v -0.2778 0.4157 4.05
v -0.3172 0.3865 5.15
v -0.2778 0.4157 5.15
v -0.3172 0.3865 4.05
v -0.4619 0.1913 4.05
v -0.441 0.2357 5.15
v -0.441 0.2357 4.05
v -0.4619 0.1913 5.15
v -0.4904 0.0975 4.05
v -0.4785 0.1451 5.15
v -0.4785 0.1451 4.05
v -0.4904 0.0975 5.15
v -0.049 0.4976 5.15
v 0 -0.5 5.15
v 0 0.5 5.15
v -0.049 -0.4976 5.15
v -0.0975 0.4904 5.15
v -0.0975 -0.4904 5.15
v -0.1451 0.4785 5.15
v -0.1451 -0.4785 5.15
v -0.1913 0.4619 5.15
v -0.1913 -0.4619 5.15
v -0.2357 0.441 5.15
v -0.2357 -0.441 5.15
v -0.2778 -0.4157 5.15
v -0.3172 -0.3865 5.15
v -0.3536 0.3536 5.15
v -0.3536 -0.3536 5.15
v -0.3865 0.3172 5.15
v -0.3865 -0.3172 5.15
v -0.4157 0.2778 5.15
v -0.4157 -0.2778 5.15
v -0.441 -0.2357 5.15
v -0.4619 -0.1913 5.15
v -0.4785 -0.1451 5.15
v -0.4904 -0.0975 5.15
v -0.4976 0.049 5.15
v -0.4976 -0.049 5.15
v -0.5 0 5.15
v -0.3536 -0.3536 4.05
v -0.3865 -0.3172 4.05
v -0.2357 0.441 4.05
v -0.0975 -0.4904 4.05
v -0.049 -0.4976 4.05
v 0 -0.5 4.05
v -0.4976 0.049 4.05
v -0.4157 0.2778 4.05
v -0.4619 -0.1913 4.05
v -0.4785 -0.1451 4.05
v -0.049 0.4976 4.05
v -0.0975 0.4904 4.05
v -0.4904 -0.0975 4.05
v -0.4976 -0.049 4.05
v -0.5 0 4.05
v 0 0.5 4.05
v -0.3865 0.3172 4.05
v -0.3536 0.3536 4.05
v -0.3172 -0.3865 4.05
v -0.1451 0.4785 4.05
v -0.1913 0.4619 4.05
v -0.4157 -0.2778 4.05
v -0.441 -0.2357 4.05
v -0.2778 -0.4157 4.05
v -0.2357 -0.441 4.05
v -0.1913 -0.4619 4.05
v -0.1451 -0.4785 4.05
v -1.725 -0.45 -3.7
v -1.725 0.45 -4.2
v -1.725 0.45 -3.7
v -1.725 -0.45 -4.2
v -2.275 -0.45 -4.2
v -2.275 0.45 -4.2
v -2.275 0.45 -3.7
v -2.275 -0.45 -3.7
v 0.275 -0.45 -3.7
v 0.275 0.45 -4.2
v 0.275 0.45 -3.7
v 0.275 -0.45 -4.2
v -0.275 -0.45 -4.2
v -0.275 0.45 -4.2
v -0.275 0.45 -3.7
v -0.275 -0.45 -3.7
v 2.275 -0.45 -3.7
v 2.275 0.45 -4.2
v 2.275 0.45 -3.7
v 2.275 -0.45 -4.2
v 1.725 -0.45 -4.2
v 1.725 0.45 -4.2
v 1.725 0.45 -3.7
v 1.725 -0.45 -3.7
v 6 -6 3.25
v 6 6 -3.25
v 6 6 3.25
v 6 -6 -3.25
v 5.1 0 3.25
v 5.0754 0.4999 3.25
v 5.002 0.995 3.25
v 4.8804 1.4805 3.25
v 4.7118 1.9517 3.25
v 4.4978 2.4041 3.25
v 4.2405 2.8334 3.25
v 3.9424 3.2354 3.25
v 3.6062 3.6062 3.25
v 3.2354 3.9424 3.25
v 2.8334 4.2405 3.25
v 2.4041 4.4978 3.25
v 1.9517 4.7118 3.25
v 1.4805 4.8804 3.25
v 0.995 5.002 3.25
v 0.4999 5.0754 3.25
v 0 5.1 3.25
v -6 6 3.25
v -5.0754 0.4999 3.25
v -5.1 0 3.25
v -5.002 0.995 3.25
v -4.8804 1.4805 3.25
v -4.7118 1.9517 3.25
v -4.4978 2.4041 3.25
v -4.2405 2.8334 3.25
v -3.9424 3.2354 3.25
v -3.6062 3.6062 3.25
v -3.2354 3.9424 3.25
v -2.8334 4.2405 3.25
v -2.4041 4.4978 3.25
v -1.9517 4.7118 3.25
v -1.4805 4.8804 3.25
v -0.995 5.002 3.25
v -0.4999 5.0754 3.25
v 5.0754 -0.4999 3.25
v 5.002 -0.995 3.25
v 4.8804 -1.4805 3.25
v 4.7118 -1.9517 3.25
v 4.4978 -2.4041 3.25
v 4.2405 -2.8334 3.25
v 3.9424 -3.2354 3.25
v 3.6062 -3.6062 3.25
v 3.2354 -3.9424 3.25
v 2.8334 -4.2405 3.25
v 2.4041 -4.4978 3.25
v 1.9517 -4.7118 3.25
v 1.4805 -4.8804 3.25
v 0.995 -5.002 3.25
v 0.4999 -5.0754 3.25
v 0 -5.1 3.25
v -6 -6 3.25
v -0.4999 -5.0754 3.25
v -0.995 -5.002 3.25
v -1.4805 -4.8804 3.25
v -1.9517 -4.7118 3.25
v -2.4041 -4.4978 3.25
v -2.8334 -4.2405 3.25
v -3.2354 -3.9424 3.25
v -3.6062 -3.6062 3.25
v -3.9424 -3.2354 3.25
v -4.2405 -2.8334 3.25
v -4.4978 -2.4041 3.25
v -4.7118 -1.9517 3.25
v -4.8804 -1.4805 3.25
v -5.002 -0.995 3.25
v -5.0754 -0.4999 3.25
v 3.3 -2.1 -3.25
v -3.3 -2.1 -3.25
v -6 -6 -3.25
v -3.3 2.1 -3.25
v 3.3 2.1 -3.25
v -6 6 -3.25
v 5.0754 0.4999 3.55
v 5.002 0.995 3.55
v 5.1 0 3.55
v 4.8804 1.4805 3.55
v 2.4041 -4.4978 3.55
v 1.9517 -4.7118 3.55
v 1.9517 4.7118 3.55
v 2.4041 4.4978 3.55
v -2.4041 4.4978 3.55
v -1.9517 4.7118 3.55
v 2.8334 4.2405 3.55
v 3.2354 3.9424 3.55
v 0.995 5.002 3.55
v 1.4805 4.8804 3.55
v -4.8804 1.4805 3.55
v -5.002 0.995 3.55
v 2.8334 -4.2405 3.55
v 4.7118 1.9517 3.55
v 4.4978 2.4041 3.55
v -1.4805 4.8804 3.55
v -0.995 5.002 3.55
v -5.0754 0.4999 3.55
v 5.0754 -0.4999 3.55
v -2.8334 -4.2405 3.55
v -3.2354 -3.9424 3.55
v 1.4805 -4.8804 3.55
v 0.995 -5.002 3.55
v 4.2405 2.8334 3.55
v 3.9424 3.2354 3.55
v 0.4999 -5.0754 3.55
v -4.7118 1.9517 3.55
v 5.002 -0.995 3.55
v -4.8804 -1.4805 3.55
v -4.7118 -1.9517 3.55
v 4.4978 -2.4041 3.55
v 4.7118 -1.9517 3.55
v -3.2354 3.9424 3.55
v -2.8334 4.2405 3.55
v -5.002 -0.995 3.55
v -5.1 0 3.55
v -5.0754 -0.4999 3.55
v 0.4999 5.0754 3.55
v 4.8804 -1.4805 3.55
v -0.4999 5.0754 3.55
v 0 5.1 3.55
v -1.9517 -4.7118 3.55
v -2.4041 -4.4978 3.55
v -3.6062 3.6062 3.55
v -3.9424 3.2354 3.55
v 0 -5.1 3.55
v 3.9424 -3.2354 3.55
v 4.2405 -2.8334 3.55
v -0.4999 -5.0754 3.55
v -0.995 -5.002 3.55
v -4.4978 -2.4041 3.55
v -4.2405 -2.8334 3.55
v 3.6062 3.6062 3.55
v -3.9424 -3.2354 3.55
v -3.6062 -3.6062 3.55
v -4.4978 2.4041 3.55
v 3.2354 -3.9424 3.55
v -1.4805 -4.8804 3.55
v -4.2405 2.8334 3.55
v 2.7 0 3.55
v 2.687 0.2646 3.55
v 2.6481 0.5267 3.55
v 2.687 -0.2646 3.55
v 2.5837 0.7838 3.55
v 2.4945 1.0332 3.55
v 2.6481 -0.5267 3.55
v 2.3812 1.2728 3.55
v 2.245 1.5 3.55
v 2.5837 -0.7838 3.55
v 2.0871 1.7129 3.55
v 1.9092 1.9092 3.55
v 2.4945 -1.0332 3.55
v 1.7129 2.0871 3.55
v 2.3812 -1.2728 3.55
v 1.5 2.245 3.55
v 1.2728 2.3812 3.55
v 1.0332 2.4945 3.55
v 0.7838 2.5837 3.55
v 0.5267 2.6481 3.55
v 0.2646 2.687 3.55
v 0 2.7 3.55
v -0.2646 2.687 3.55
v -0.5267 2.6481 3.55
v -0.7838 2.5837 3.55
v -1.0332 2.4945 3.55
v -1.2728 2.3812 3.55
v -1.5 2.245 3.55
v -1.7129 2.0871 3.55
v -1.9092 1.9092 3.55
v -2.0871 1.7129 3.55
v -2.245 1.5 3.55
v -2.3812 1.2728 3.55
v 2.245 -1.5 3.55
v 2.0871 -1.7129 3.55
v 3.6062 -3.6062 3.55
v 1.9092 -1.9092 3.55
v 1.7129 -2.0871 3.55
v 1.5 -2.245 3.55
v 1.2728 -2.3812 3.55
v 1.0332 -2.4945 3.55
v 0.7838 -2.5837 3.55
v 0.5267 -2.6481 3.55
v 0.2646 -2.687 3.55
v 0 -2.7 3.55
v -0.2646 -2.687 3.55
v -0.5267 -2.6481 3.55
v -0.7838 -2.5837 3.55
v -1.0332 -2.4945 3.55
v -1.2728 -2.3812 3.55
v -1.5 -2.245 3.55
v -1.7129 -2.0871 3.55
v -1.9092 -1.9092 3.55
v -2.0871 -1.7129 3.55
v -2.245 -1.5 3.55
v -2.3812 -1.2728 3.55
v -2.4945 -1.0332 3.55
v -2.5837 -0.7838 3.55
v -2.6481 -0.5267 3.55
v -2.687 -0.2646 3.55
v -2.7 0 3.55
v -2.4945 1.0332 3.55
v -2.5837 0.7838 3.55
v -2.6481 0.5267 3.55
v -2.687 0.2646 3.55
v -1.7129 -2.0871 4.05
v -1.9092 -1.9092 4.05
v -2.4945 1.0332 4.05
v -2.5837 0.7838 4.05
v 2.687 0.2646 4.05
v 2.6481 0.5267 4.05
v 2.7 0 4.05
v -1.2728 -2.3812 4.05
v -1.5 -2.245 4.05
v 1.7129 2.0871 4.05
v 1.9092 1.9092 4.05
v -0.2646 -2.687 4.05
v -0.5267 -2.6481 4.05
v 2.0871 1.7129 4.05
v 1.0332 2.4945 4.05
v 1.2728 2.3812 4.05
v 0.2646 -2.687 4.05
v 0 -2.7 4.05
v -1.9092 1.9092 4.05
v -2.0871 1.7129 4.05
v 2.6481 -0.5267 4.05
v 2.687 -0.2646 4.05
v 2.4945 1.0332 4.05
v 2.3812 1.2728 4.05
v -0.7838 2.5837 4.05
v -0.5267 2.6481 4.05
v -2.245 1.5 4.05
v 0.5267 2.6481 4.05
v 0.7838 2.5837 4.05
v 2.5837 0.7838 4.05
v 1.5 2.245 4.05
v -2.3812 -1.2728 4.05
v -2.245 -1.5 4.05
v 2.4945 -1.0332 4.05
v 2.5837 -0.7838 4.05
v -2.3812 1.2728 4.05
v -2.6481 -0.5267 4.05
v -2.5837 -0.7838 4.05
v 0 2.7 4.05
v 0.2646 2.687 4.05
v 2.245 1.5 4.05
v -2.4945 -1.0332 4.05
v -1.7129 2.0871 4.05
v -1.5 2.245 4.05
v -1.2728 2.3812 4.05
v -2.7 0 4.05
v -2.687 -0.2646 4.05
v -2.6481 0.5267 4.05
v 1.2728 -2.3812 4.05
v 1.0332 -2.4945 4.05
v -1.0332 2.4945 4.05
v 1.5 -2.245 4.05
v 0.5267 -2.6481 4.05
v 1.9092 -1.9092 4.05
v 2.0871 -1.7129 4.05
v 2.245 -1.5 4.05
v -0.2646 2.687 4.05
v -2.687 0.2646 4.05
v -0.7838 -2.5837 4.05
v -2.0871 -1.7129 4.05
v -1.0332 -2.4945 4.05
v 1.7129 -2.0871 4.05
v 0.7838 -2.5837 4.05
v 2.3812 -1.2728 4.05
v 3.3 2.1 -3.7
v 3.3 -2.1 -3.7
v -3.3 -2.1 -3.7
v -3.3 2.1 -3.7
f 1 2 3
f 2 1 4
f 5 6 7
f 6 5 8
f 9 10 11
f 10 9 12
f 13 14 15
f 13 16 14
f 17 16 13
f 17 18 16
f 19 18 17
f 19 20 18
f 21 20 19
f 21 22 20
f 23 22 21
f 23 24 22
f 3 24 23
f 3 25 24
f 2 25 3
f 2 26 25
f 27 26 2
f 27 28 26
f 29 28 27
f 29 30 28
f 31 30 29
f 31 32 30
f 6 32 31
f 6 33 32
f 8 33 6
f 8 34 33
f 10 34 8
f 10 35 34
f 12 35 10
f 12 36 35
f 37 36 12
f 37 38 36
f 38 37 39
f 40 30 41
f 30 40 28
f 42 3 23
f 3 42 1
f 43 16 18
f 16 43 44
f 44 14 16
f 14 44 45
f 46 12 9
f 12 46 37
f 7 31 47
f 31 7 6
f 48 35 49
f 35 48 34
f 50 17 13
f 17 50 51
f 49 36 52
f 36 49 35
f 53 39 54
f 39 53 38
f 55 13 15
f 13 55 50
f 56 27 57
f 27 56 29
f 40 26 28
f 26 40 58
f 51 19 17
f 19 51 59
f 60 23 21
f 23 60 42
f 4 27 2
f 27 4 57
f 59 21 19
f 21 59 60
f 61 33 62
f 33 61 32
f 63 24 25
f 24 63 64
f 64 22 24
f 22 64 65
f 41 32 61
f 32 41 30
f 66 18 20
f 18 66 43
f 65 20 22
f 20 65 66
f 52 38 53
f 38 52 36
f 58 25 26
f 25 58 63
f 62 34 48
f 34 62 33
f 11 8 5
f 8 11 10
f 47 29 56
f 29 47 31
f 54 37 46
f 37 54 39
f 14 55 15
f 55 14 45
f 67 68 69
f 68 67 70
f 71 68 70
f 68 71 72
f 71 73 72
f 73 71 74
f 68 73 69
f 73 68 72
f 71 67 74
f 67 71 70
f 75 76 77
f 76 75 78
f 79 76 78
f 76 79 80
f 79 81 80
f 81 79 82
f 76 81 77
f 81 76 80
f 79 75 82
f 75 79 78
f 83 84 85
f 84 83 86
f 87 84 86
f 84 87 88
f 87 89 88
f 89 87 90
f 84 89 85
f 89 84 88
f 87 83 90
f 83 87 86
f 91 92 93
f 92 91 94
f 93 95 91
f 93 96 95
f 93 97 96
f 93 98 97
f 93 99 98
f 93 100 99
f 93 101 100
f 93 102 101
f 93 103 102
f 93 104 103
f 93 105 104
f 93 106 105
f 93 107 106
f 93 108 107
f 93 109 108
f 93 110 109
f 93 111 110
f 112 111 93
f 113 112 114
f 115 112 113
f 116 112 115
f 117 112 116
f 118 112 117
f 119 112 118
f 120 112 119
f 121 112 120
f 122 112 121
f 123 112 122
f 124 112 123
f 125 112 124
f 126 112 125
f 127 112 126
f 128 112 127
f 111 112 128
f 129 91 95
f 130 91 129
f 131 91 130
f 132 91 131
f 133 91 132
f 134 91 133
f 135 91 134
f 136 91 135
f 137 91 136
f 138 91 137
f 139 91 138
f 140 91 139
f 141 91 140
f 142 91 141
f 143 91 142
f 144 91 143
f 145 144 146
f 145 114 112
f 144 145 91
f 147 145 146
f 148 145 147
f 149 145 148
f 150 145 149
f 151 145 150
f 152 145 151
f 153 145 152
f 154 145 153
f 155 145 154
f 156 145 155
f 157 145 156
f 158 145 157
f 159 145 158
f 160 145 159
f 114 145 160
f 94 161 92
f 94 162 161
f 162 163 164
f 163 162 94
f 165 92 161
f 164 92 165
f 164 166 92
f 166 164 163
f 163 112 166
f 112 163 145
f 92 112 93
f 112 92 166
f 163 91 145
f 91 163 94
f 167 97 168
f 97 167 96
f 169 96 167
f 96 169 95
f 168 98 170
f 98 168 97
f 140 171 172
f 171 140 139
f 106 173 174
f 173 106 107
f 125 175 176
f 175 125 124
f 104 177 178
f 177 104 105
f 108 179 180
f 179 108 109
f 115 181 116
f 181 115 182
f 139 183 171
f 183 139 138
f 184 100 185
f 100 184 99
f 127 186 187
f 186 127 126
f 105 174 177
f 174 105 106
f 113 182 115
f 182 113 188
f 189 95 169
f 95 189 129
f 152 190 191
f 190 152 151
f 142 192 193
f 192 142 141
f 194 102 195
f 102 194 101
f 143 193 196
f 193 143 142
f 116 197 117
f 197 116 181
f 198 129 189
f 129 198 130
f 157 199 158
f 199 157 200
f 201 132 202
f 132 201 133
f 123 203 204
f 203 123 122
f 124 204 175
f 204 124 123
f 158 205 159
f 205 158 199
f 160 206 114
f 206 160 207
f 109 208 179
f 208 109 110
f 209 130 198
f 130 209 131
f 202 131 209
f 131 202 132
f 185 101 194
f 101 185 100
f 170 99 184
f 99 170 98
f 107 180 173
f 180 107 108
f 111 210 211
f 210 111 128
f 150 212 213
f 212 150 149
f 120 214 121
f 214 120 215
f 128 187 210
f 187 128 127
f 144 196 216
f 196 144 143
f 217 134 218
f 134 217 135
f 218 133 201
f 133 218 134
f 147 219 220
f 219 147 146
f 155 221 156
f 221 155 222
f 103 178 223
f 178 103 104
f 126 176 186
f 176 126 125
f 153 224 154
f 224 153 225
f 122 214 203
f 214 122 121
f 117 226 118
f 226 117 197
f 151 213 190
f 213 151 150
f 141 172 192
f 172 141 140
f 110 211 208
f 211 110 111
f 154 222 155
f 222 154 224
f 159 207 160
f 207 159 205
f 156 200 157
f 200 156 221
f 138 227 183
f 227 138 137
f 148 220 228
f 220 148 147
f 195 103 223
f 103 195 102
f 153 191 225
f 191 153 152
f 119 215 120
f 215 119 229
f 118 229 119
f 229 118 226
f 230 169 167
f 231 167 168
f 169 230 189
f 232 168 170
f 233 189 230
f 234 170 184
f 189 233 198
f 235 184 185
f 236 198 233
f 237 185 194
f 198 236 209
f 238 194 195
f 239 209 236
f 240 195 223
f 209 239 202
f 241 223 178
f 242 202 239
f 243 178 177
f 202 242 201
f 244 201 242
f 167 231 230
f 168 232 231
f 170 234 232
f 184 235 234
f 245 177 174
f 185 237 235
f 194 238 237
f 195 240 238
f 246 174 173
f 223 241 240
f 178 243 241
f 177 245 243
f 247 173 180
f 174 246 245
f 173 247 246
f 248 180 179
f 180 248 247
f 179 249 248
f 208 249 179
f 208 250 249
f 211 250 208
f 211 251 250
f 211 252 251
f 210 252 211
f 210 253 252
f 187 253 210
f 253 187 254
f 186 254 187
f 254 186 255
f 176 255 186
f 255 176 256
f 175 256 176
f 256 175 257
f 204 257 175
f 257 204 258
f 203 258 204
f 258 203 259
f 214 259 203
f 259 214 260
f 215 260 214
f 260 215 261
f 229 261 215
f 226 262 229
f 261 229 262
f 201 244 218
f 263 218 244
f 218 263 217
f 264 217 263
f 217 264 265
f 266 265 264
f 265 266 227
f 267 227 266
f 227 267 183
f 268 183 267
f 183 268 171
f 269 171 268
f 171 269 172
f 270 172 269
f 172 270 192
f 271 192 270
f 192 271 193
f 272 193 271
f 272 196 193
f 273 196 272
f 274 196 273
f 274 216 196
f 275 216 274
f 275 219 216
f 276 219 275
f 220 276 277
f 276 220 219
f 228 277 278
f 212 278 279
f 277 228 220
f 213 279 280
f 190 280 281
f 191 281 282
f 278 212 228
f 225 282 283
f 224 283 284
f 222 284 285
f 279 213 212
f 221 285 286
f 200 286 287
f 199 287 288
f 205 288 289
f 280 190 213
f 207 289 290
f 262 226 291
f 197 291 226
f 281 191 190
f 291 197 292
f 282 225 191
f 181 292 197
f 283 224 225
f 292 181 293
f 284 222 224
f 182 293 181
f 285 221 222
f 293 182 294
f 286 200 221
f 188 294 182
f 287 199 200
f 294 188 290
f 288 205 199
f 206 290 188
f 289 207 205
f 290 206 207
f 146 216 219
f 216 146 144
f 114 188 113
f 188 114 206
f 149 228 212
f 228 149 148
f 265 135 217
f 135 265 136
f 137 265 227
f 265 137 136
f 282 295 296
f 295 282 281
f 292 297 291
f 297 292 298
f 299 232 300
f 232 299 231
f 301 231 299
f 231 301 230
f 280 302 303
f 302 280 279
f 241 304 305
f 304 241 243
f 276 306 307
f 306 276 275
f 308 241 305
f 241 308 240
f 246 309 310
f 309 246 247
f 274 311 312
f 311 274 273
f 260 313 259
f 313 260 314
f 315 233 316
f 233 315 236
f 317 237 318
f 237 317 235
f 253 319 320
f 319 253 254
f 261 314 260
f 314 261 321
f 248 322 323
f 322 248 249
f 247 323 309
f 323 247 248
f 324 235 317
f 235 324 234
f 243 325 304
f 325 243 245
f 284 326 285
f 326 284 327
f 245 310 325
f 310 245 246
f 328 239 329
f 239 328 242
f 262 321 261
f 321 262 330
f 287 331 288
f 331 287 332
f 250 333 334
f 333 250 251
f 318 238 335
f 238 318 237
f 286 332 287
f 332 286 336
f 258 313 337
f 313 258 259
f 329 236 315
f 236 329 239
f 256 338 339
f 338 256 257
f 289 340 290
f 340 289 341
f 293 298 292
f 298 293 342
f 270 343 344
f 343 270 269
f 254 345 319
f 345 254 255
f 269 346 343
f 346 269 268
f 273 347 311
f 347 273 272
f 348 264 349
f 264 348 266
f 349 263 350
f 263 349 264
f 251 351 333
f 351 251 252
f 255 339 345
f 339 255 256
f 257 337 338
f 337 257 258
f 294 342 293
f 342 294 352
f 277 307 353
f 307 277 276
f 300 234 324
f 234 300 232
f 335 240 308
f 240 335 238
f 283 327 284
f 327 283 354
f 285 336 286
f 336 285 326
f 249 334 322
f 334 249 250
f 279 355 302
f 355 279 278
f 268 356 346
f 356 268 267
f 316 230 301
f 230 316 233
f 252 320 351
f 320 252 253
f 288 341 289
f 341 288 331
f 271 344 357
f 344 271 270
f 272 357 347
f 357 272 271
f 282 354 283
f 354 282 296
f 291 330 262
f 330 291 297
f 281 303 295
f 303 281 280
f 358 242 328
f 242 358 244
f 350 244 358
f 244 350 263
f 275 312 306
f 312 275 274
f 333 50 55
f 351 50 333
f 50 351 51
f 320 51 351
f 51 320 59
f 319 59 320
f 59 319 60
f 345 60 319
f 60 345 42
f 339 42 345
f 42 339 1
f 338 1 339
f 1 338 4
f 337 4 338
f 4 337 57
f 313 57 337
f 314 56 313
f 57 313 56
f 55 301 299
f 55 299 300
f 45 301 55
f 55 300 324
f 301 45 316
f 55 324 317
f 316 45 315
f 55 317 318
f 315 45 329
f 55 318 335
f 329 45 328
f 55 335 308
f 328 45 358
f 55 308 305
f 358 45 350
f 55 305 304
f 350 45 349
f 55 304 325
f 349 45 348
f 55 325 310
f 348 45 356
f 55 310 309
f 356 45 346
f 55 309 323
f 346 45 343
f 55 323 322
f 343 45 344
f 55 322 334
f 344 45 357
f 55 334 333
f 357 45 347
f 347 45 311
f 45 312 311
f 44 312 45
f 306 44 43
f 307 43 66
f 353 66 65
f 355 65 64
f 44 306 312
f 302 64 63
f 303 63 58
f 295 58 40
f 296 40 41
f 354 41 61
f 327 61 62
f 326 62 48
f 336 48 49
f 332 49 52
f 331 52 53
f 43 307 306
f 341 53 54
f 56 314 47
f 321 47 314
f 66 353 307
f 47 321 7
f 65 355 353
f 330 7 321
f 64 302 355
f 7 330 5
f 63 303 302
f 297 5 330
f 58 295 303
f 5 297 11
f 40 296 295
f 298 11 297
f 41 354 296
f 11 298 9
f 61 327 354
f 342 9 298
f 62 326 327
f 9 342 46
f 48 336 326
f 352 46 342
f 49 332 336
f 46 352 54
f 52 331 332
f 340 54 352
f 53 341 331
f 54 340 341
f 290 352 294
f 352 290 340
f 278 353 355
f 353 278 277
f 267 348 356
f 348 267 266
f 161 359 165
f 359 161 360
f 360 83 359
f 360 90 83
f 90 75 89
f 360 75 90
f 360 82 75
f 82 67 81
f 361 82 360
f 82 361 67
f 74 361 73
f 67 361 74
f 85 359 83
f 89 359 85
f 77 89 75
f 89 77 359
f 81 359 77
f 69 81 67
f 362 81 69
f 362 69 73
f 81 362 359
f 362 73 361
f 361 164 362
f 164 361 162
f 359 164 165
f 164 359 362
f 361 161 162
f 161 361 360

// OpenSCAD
$fn = 64;

// Potentiometer target envelope (approx): [W, D, H, shaft_d] = [12, 12, 6.5, 1.0]
module potentiometer(dim = [12,12,6.5,1.0]) {
    w = dim[0];
    d = dim[1];
    h = dim[2];
    shaft_d = dim[3];

    // Overlap to guarantee one connected solid (and avoid coplanar faces)
    ov = 0.25;

    // Main body
    body_w = w;
    body_d = d;
    body_h = h;

    // Z extents of body (centered)
    z_front =  body_h/2;
    z_back  = -body_h/2;

    // Front details (kept compact)
    flange_d = min(w, d) * 0.85;
    flange_h = 0.55;

    bushing_d = min(w, d) * 0.45;
    bushing_h = 0.75;

    shaft_len  = 1.35;
    shaft_flat = 0.18;

    // Terminals (3 pins) on back side
    pin_w = 0.55;
    pin_d = 0.9;
    pin_h = 1.2;
    pin_pitch = 2.0;

    // Anti-rotation tab on front
    tab_w = 1.2;
    tab_d = 0.8;
    tab_h = 0.5;

    // Helper: D-shaft as a solid (intersection avoids "difference inside union" preview issues)
    module d_shaft(diam, len, flat_depth) {
        intersection() {
            cylinder(d=diam, h=len, center=true);
            // Keep most of the cylinder, cut a flat by intersecting with a half-space box
            translate([-(diam/2 - flat_depth/2), 0, 0])
                cube([diam - flat_depth, diam*2, len*2], center=true);
        }
    }

    union() {
        // Main body
        cube([body_w, body_d, body_h], center=true);

        // Front flange
        translate([0, 0, z_front + flange_h/2 - ov])
            cylinder(d=flange_d, h=flange_h, center=true);

        // Front bushing
        translate([0, 0, z_front + flange_h - ov + bushing_h/2 - ov])
            cylinder(d=bushing_d, h=bushing_h, center=true);

        // Shaft (D-shaft)
        translate([0, 0, z_front + flange_h - ov + bushing_h - ov + shaft_len/2 - ov])
            d_shaft(shaft_d, shaft_len, shaft_flat);

        // Anti-rotation tab (front), connected to flange
        translate([0, flange_d/2 - tab_d/2 - ov, z_front + flange_h/2 - ov])
            cube([tab_w, tab_d, tab_h], center=true);

        // Back terminals (3 pins), connected to body with overlap
        for (i = [-1, 0, 1]) {
            translate([i*pin_pitch, 0, z_back - pin_h/2 + ov])
                cube([pin_w, pin_d, pin_h], center=true);
        }

        // Back boss / base for terminals, overlaps into body
        back_boss_w = min(w,d)*0.55;
        back_boss_d = min(w,d)*0.35;
        back_boss_h = 0.7;
        translate([0, 0, z_back - back_boss_h/2 + ov])
            cube([back_boss_w, back_boss_d, back_boss_h], center=true);
    }
}

potentiometer([12,12,6.5,1.0]);
